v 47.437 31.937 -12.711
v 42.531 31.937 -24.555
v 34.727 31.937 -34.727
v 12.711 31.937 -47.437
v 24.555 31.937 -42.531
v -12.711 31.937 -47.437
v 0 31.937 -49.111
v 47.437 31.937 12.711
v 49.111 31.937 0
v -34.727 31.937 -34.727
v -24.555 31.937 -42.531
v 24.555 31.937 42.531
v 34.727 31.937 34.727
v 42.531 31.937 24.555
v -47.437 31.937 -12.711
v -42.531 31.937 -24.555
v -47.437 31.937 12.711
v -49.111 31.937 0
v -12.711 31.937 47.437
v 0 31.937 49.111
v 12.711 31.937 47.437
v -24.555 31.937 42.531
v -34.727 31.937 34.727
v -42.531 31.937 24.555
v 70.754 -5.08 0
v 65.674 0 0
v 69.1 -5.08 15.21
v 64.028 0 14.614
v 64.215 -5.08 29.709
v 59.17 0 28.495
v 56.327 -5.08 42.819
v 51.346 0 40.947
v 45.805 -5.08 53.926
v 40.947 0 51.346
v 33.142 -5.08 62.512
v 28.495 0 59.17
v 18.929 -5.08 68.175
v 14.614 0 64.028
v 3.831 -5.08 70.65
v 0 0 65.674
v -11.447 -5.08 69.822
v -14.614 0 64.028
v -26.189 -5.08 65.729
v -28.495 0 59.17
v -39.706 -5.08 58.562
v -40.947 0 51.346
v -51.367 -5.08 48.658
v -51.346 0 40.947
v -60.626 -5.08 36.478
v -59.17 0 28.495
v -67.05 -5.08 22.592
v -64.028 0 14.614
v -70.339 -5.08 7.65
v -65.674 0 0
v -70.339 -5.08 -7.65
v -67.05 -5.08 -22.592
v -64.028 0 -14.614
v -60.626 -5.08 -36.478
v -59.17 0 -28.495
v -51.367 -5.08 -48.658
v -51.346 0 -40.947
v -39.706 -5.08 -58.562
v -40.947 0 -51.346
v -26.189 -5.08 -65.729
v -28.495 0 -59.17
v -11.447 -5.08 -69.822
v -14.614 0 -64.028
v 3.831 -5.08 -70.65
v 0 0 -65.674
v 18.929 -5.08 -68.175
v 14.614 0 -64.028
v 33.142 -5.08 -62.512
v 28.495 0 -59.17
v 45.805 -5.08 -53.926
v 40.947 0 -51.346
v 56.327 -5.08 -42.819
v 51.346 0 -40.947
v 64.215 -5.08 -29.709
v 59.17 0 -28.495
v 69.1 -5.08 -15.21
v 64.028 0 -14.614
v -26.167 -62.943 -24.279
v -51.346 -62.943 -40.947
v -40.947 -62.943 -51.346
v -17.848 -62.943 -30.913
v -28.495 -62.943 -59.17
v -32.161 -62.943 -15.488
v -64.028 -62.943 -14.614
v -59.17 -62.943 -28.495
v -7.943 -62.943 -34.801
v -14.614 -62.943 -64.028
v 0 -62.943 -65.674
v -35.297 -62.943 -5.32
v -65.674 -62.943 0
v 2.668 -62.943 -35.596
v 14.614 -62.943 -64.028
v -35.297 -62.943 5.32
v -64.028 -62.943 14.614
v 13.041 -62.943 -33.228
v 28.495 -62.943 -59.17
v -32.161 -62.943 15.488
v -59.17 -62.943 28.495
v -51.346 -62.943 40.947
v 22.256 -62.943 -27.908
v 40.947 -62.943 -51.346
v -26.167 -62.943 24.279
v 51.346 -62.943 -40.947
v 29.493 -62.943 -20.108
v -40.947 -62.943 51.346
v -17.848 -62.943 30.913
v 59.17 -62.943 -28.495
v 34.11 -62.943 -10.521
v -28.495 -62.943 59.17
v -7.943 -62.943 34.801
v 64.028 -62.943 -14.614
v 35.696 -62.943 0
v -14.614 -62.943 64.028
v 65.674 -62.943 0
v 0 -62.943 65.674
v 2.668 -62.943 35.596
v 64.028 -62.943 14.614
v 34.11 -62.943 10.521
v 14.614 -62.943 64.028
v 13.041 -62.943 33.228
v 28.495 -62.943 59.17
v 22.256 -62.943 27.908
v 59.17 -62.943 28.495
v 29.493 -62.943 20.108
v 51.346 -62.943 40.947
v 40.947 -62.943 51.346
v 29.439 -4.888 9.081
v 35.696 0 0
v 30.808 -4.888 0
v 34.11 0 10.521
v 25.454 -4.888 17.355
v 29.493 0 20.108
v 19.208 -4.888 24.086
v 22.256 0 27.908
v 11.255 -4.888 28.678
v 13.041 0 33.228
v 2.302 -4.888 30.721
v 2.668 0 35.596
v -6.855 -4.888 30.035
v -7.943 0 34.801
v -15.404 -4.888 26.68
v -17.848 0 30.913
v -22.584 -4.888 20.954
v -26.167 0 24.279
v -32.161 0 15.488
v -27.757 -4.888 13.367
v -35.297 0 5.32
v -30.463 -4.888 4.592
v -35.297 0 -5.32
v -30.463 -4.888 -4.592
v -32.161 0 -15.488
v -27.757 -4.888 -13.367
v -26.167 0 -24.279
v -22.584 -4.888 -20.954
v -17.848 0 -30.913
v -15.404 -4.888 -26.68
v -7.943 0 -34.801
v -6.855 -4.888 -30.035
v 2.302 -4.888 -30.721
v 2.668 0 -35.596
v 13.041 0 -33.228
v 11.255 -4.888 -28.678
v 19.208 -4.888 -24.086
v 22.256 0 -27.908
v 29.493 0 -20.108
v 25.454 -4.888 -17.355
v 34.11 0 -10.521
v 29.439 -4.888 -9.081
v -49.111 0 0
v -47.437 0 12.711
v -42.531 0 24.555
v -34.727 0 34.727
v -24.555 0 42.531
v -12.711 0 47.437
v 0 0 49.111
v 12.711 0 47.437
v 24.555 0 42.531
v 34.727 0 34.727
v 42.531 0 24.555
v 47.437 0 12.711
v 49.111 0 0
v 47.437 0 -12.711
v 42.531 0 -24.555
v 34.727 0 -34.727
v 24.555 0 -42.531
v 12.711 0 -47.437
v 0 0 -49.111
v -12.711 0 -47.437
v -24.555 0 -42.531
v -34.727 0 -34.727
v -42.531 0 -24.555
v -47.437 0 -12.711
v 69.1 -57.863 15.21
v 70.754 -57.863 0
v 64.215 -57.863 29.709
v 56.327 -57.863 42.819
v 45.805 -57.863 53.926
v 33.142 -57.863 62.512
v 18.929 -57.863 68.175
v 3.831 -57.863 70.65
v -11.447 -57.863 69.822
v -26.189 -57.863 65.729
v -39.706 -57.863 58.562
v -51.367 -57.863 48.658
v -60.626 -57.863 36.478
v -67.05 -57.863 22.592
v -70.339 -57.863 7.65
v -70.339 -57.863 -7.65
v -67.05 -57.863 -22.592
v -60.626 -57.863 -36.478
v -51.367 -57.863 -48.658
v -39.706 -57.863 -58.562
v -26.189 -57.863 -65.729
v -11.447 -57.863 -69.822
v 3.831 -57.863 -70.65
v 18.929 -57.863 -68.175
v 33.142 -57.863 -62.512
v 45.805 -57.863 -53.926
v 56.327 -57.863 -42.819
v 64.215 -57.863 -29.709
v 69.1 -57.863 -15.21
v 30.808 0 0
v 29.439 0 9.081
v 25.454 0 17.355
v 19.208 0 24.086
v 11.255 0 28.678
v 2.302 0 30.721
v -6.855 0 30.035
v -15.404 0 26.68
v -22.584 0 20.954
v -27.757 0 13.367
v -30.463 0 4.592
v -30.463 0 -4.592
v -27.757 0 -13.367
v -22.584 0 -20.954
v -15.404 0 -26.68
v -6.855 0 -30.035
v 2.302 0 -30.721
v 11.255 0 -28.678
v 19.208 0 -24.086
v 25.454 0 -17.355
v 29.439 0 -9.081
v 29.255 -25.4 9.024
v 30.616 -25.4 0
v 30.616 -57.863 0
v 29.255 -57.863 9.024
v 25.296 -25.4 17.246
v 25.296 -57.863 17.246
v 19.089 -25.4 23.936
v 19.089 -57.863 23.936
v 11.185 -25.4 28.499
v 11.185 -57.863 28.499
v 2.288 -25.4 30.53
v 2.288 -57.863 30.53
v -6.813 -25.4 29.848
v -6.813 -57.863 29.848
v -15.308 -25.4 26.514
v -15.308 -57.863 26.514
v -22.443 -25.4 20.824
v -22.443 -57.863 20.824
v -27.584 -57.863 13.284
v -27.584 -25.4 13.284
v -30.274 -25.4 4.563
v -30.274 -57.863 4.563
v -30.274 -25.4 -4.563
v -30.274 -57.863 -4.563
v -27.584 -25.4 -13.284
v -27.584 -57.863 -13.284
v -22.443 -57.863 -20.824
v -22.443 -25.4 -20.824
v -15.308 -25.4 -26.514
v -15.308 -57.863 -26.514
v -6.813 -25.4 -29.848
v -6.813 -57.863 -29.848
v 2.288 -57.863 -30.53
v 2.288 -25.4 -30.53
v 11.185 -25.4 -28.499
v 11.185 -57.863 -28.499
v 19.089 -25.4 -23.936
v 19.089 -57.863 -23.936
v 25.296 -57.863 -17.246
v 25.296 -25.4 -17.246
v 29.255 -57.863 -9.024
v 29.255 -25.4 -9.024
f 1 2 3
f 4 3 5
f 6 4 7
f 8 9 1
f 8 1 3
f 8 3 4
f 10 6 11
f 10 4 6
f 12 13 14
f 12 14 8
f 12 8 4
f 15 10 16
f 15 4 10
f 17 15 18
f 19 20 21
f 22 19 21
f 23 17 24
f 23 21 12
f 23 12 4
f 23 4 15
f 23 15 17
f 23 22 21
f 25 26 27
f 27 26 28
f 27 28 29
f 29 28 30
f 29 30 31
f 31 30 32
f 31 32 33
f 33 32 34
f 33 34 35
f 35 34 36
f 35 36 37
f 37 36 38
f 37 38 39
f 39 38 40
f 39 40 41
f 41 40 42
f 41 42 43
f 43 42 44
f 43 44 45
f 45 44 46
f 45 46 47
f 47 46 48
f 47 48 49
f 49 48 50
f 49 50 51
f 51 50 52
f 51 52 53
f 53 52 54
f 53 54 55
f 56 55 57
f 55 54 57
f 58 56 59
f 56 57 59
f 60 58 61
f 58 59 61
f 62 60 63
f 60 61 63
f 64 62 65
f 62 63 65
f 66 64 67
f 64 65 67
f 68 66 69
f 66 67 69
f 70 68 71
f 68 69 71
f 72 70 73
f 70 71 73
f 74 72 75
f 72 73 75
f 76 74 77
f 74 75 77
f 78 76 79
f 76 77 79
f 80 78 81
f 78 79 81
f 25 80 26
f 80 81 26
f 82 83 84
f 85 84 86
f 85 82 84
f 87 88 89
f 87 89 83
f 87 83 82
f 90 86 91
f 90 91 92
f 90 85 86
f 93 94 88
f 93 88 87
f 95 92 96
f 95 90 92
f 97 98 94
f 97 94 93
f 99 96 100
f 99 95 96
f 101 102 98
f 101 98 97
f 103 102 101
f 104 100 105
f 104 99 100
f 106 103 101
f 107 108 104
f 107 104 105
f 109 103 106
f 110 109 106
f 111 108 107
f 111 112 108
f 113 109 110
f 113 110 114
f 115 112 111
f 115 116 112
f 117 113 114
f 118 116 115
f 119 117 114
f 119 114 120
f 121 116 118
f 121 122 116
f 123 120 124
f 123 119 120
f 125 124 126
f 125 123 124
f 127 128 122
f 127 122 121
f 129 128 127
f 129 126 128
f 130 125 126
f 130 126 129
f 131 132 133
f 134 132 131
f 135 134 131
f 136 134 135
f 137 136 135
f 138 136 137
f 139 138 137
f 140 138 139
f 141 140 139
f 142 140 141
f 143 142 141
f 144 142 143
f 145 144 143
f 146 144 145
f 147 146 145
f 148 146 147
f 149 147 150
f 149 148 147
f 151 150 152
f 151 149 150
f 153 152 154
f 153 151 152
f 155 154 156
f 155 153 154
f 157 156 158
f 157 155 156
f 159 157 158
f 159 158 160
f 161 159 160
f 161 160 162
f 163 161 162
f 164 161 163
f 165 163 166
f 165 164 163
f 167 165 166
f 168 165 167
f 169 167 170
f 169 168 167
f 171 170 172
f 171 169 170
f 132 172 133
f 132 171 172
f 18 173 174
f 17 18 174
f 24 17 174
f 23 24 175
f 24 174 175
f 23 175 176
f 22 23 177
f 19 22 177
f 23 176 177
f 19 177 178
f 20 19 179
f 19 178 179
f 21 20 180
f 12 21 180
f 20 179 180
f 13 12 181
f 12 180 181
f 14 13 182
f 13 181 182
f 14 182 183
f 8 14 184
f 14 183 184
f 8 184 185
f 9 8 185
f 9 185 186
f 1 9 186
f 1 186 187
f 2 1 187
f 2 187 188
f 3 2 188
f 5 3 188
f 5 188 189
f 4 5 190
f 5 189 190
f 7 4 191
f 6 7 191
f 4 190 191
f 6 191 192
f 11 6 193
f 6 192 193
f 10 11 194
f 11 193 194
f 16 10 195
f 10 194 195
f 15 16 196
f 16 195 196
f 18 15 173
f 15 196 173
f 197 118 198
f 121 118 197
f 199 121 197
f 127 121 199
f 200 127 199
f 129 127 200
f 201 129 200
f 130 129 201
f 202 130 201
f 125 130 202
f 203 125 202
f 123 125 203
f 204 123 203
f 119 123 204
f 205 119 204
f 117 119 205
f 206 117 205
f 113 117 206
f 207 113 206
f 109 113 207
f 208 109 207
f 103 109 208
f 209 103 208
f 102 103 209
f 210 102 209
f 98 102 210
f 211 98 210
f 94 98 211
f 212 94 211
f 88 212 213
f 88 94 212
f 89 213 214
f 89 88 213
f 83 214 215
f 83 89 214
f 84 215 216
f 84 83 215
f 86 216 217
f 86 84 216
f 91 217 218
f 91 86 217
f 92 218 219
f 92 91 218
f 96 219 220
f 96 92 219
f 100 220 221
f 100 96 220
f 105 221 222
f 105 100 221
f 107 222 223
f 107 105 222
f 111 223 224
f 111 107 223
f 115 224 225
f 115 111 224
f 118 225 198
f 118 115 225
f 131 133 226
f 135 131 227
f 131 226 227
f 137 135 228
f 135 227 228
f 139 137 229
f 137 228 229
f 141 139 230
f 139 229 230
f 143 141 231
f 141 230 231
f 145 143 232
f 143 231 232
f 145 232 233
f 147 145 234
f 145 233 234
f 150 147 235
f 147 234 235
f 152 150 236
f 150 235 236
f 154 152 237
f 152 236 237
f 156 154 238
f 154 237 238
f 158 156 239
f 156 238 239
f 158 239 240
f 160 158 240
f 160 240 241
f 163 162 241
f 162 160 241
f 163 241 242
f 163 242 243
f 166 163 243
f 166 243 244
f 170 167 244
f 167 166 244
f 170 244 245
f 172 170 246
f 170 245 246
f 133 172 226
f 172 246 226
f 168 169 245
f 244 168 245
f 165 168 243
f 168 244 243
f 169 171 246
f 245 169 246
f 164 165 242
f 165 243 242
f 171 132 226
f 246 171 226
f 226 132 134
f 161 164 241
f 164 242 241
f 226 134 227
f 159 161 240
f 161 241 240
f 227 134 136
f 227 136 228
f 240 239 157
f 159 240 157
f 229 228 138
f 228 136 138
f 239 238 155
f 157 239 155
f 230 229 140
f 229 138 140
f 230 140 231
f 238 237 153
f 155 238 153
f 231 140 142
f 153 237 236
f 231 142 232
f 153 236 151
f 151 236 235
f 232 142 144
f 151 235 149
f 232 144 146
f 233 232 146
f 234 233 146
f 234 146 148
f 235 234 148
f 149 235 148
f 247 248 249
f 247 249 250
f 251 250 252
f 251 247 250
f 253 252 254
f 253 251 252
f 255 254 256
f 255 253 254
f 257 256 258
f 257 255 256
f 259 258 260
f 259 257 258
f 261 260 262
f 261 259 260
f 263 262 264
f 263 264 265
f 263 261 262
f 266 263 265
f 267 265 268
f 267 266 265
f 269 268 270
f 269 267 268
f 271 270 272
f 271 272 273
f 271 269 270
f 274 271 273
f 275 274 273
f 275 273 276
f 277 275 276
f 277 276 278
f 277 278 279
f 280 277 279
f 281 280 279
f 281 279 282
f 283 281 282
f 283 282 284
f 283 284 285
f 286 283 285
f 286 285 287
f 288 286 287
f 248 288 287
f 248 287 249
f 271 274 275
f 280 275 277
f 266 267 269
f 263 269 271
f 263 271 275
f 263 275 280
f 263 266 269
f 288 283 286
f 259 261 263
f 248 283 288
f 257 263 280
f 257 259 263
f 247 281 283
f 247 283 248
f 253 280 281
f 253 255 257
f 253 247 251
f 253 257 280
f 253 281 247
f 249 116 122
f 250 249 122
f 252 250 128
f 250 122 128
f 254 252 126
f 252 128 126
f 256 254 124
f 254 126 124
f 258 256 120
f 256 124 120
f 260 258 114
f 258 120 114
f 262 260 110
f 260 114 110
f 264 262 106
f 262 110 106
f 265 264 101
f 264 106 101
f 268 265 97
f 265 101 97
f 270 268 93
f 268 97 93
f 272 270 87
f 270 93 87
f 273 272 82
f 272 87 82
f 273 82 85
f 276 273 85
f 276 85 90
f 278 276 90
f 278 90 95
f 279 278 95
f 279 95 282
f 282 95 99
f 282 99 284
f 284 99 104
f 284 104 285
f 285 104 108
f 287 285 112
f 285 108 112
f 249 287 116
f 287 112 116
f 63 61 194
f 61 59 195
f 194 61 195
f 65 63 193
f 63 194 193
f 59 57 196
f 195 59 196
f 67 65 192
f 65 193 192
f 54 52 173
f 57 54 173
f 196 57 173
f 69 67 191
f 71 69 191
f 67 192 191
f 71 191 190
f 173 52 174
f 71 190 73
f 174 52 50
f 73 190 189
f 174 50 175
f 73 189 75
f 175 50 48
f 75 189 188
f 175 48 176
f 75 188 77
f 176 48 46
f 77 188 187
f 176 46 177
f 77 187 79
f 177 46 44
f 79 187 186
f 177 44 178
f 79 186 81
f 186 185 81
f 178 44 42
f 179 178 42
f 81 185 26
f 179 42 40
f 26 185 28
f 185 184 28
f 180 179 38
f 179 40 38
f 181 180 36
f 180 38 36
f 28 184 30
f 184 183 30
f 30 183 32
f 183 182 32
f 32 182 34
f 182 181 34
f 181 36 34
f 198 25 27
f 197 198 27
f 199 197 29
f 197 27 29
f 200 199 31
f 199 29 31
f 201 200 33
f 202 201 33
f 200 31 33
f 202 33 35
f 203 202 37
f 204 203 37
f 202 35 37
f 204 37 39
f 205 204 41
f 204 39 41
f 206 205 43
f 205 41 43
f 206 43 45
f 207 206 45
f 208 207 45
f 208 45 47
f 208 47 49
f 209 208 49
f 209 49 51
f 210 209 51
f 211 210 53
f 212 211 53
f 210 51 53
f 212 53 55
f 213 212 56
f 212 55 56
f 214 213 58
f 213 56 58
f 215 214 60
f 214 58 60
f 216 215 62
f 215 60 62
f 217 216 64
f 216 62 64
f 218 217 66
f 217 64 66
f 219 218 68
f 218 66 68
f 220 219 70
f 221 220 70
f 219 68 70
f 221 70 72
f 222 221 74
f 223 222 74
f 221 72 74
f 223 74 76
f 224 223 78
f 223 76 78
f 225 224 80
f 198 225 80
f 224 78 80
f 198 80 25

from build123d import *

# Parameters (mm, degrees)
F0_R     = 70.754206
F0_R_2   = 30.61563
F1_DEPTH = 62.94323
F2_SIZE  = 5.08
F3_R     = 49.110823
F4_DEPTH = 31.93714
F5_R     = 30.807574
F6_DEPTH = 25.4


with BuildPart() as f1:
    # F0 (on Front) → F1 (new body)
    with BuildSketch(Plane.XZ):
        Circle(F0_R)
        Circle(F0_R_2, mode=Mode.SUBTRACT)
    extrude(amount=F1_DEPTH)

    # F2
    f2_edges = [f1.edges().sort_by_distance(p)[0] for p in [
        (-70.754206, -62.94323, 0),
        (-30.61563, -62.94323, 0),
        (-70.754206, 0, 0),
        (-30.61563, 0, 0),
    ]]
    chamfer(f2_edges, length=F2_SIZE)

    # F3 (on face) → F4 (join)
    with BuildSketch(Plane(origin=(0, 0, 0), x_dir=(-1, 0, 0), z_dir=(0, 1, 0))):
        Circle(F3_R)
    extrude(amount=F4_DEPTH)

    # F5 (on Front) → F6 (join)
    with BuildSketch(Plane.XZ):
        Circle(F5_R)
    extrude(amount=F6_DEPTH)


solid = f1.part
